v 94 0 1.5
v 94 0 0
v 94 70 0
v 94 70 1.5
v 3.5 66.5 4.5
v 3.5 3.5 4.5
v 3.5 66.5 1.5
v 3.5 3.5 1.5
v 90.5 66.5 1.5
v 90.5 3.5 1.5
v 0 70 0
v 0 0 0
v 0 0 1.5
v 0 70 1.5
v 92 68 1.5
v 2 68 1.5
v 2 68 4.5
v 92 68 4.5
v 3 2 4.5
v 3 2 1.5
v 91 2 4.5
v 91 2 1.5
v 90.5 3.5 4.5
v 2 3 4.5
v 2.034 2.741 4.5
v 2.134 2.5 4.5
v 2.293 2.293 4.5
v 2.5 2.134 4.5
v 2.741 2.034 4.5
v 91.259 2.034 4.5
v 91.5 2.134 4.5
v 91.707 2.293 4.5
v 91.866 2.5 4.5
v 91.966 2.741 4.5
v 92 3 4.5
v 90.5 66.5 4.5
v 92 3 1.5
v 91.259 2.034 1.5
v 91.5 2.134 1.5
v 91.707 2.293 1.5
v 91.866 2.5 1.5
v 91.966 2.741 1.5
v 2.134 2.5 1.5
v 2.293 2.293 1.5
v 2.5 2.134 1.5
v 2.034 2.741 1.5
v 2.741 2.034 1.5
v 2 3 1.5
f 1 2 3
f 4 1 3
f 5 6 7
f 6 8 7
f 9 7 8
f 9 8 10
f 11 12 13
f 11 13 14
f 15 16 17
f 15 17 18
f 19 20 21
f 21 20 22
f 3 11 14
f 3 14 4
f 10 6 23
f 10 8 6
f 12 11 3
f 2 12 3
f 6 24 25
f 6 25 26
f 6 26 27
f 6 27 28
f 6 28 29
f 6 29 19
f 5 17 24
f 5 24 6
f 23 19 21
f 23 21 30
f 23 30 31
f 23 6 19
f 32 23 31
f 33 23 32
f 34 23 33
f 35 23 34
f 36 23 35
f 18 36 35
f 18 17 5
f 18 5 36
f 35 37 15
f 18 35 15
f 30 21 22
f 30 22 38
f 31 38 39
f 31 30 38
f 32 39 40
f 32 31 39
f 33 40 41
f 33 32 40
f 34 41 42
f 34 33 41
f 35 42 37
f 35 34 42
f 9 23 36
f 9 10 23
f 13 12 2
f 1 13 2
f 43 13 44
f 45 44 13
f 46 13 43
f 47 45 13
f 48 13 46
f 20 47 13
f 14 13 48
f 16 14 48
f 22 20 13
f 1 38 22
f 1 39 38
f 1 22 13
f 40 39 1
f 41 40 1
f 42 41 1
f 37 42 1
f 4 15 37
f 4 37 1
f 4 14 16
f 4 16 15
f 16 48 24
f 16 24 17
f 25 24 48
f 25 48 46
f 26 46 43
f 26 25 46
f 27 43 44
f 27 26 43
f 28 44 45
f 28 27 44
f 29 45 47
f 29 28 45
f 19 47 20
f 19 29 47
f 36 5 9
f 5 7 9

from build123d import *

# Parameters (mm, degrees)
BOX001_W     = 90
BOX001_H     = 66
BOX001_DEPTH = 4.5
THICKNESS_T  = -1.5
FILLET001_R  = 1.5
BOX_W        = 94
BOX_H        = 70
BOX_DEPTH    = 1.5
FILLET_R     = 1
FILLET002_R  = 1


with BuildPart() as thickness:
    # Box001 → Box001 (new body)
    with BuildSketch(Plane(origin=(2, 2, 0), x_dir=(1, 0, 0), z_dir=(0, 0, 1))):
        with Locations((45, 33)):
            Rectangle(BOX001_W, BOX001_H)
    extrude(amount=BOX001_DEPTH)

    # Thickness
    thickness_openings = [thickness.faces().sort_by_distance(p)[0] for p in [
        (47, 35, 4.5),
    ]]
    offset(amount=THICKNESS_T, openings=thickness_openings)


with BuildPart() as fillet001:
    # Fillet001 base: copy of Thickness
    add(thickness.part)

    # Fillet001
    fillet001_edges = [fillet001.edges().sort_by_distance(p)[0] for p in [
        (92, 2, 2.25),
        (2, 2, 2.25),
    ]]
    fillet(fillet001_edges, radius=FILLET001_R)


with BuildPart() as w_rfel:
    # Box → Box (new body)
    with BuildSketch(Plane.XY):
        with Locations((47, 35)):
            Rectangle(BOX_W, BOX_H)
    extrude(amount=BOX_DEPTH)


with BuildPart() as fusion001:
    # Fillet base: copy of Thickness
    add(thickness.part)

    # Fillet
    fillet_edges = [fusion001.edges().sort_by_distance(p)[0] for p in [
        (92, 2, 2.25),
        (2, 2, 2.25),
    ]]
    fillet(fillet_edges, radius=FILLET_R)

    # Fillet002
    fillet002_edges = [fusion001.edges().sort_by_distance(p)[0] for p in [
        (92, 68, 2.25),
        (2, 68, 2.25),
    ]]
    fillet(fillet002_edges, radius=FILLET002_R)

    # Fusion: union Fillet001, Würfel
    add(fillet001.part)
    add(w_rfel.part)


solid = fusion001.part
